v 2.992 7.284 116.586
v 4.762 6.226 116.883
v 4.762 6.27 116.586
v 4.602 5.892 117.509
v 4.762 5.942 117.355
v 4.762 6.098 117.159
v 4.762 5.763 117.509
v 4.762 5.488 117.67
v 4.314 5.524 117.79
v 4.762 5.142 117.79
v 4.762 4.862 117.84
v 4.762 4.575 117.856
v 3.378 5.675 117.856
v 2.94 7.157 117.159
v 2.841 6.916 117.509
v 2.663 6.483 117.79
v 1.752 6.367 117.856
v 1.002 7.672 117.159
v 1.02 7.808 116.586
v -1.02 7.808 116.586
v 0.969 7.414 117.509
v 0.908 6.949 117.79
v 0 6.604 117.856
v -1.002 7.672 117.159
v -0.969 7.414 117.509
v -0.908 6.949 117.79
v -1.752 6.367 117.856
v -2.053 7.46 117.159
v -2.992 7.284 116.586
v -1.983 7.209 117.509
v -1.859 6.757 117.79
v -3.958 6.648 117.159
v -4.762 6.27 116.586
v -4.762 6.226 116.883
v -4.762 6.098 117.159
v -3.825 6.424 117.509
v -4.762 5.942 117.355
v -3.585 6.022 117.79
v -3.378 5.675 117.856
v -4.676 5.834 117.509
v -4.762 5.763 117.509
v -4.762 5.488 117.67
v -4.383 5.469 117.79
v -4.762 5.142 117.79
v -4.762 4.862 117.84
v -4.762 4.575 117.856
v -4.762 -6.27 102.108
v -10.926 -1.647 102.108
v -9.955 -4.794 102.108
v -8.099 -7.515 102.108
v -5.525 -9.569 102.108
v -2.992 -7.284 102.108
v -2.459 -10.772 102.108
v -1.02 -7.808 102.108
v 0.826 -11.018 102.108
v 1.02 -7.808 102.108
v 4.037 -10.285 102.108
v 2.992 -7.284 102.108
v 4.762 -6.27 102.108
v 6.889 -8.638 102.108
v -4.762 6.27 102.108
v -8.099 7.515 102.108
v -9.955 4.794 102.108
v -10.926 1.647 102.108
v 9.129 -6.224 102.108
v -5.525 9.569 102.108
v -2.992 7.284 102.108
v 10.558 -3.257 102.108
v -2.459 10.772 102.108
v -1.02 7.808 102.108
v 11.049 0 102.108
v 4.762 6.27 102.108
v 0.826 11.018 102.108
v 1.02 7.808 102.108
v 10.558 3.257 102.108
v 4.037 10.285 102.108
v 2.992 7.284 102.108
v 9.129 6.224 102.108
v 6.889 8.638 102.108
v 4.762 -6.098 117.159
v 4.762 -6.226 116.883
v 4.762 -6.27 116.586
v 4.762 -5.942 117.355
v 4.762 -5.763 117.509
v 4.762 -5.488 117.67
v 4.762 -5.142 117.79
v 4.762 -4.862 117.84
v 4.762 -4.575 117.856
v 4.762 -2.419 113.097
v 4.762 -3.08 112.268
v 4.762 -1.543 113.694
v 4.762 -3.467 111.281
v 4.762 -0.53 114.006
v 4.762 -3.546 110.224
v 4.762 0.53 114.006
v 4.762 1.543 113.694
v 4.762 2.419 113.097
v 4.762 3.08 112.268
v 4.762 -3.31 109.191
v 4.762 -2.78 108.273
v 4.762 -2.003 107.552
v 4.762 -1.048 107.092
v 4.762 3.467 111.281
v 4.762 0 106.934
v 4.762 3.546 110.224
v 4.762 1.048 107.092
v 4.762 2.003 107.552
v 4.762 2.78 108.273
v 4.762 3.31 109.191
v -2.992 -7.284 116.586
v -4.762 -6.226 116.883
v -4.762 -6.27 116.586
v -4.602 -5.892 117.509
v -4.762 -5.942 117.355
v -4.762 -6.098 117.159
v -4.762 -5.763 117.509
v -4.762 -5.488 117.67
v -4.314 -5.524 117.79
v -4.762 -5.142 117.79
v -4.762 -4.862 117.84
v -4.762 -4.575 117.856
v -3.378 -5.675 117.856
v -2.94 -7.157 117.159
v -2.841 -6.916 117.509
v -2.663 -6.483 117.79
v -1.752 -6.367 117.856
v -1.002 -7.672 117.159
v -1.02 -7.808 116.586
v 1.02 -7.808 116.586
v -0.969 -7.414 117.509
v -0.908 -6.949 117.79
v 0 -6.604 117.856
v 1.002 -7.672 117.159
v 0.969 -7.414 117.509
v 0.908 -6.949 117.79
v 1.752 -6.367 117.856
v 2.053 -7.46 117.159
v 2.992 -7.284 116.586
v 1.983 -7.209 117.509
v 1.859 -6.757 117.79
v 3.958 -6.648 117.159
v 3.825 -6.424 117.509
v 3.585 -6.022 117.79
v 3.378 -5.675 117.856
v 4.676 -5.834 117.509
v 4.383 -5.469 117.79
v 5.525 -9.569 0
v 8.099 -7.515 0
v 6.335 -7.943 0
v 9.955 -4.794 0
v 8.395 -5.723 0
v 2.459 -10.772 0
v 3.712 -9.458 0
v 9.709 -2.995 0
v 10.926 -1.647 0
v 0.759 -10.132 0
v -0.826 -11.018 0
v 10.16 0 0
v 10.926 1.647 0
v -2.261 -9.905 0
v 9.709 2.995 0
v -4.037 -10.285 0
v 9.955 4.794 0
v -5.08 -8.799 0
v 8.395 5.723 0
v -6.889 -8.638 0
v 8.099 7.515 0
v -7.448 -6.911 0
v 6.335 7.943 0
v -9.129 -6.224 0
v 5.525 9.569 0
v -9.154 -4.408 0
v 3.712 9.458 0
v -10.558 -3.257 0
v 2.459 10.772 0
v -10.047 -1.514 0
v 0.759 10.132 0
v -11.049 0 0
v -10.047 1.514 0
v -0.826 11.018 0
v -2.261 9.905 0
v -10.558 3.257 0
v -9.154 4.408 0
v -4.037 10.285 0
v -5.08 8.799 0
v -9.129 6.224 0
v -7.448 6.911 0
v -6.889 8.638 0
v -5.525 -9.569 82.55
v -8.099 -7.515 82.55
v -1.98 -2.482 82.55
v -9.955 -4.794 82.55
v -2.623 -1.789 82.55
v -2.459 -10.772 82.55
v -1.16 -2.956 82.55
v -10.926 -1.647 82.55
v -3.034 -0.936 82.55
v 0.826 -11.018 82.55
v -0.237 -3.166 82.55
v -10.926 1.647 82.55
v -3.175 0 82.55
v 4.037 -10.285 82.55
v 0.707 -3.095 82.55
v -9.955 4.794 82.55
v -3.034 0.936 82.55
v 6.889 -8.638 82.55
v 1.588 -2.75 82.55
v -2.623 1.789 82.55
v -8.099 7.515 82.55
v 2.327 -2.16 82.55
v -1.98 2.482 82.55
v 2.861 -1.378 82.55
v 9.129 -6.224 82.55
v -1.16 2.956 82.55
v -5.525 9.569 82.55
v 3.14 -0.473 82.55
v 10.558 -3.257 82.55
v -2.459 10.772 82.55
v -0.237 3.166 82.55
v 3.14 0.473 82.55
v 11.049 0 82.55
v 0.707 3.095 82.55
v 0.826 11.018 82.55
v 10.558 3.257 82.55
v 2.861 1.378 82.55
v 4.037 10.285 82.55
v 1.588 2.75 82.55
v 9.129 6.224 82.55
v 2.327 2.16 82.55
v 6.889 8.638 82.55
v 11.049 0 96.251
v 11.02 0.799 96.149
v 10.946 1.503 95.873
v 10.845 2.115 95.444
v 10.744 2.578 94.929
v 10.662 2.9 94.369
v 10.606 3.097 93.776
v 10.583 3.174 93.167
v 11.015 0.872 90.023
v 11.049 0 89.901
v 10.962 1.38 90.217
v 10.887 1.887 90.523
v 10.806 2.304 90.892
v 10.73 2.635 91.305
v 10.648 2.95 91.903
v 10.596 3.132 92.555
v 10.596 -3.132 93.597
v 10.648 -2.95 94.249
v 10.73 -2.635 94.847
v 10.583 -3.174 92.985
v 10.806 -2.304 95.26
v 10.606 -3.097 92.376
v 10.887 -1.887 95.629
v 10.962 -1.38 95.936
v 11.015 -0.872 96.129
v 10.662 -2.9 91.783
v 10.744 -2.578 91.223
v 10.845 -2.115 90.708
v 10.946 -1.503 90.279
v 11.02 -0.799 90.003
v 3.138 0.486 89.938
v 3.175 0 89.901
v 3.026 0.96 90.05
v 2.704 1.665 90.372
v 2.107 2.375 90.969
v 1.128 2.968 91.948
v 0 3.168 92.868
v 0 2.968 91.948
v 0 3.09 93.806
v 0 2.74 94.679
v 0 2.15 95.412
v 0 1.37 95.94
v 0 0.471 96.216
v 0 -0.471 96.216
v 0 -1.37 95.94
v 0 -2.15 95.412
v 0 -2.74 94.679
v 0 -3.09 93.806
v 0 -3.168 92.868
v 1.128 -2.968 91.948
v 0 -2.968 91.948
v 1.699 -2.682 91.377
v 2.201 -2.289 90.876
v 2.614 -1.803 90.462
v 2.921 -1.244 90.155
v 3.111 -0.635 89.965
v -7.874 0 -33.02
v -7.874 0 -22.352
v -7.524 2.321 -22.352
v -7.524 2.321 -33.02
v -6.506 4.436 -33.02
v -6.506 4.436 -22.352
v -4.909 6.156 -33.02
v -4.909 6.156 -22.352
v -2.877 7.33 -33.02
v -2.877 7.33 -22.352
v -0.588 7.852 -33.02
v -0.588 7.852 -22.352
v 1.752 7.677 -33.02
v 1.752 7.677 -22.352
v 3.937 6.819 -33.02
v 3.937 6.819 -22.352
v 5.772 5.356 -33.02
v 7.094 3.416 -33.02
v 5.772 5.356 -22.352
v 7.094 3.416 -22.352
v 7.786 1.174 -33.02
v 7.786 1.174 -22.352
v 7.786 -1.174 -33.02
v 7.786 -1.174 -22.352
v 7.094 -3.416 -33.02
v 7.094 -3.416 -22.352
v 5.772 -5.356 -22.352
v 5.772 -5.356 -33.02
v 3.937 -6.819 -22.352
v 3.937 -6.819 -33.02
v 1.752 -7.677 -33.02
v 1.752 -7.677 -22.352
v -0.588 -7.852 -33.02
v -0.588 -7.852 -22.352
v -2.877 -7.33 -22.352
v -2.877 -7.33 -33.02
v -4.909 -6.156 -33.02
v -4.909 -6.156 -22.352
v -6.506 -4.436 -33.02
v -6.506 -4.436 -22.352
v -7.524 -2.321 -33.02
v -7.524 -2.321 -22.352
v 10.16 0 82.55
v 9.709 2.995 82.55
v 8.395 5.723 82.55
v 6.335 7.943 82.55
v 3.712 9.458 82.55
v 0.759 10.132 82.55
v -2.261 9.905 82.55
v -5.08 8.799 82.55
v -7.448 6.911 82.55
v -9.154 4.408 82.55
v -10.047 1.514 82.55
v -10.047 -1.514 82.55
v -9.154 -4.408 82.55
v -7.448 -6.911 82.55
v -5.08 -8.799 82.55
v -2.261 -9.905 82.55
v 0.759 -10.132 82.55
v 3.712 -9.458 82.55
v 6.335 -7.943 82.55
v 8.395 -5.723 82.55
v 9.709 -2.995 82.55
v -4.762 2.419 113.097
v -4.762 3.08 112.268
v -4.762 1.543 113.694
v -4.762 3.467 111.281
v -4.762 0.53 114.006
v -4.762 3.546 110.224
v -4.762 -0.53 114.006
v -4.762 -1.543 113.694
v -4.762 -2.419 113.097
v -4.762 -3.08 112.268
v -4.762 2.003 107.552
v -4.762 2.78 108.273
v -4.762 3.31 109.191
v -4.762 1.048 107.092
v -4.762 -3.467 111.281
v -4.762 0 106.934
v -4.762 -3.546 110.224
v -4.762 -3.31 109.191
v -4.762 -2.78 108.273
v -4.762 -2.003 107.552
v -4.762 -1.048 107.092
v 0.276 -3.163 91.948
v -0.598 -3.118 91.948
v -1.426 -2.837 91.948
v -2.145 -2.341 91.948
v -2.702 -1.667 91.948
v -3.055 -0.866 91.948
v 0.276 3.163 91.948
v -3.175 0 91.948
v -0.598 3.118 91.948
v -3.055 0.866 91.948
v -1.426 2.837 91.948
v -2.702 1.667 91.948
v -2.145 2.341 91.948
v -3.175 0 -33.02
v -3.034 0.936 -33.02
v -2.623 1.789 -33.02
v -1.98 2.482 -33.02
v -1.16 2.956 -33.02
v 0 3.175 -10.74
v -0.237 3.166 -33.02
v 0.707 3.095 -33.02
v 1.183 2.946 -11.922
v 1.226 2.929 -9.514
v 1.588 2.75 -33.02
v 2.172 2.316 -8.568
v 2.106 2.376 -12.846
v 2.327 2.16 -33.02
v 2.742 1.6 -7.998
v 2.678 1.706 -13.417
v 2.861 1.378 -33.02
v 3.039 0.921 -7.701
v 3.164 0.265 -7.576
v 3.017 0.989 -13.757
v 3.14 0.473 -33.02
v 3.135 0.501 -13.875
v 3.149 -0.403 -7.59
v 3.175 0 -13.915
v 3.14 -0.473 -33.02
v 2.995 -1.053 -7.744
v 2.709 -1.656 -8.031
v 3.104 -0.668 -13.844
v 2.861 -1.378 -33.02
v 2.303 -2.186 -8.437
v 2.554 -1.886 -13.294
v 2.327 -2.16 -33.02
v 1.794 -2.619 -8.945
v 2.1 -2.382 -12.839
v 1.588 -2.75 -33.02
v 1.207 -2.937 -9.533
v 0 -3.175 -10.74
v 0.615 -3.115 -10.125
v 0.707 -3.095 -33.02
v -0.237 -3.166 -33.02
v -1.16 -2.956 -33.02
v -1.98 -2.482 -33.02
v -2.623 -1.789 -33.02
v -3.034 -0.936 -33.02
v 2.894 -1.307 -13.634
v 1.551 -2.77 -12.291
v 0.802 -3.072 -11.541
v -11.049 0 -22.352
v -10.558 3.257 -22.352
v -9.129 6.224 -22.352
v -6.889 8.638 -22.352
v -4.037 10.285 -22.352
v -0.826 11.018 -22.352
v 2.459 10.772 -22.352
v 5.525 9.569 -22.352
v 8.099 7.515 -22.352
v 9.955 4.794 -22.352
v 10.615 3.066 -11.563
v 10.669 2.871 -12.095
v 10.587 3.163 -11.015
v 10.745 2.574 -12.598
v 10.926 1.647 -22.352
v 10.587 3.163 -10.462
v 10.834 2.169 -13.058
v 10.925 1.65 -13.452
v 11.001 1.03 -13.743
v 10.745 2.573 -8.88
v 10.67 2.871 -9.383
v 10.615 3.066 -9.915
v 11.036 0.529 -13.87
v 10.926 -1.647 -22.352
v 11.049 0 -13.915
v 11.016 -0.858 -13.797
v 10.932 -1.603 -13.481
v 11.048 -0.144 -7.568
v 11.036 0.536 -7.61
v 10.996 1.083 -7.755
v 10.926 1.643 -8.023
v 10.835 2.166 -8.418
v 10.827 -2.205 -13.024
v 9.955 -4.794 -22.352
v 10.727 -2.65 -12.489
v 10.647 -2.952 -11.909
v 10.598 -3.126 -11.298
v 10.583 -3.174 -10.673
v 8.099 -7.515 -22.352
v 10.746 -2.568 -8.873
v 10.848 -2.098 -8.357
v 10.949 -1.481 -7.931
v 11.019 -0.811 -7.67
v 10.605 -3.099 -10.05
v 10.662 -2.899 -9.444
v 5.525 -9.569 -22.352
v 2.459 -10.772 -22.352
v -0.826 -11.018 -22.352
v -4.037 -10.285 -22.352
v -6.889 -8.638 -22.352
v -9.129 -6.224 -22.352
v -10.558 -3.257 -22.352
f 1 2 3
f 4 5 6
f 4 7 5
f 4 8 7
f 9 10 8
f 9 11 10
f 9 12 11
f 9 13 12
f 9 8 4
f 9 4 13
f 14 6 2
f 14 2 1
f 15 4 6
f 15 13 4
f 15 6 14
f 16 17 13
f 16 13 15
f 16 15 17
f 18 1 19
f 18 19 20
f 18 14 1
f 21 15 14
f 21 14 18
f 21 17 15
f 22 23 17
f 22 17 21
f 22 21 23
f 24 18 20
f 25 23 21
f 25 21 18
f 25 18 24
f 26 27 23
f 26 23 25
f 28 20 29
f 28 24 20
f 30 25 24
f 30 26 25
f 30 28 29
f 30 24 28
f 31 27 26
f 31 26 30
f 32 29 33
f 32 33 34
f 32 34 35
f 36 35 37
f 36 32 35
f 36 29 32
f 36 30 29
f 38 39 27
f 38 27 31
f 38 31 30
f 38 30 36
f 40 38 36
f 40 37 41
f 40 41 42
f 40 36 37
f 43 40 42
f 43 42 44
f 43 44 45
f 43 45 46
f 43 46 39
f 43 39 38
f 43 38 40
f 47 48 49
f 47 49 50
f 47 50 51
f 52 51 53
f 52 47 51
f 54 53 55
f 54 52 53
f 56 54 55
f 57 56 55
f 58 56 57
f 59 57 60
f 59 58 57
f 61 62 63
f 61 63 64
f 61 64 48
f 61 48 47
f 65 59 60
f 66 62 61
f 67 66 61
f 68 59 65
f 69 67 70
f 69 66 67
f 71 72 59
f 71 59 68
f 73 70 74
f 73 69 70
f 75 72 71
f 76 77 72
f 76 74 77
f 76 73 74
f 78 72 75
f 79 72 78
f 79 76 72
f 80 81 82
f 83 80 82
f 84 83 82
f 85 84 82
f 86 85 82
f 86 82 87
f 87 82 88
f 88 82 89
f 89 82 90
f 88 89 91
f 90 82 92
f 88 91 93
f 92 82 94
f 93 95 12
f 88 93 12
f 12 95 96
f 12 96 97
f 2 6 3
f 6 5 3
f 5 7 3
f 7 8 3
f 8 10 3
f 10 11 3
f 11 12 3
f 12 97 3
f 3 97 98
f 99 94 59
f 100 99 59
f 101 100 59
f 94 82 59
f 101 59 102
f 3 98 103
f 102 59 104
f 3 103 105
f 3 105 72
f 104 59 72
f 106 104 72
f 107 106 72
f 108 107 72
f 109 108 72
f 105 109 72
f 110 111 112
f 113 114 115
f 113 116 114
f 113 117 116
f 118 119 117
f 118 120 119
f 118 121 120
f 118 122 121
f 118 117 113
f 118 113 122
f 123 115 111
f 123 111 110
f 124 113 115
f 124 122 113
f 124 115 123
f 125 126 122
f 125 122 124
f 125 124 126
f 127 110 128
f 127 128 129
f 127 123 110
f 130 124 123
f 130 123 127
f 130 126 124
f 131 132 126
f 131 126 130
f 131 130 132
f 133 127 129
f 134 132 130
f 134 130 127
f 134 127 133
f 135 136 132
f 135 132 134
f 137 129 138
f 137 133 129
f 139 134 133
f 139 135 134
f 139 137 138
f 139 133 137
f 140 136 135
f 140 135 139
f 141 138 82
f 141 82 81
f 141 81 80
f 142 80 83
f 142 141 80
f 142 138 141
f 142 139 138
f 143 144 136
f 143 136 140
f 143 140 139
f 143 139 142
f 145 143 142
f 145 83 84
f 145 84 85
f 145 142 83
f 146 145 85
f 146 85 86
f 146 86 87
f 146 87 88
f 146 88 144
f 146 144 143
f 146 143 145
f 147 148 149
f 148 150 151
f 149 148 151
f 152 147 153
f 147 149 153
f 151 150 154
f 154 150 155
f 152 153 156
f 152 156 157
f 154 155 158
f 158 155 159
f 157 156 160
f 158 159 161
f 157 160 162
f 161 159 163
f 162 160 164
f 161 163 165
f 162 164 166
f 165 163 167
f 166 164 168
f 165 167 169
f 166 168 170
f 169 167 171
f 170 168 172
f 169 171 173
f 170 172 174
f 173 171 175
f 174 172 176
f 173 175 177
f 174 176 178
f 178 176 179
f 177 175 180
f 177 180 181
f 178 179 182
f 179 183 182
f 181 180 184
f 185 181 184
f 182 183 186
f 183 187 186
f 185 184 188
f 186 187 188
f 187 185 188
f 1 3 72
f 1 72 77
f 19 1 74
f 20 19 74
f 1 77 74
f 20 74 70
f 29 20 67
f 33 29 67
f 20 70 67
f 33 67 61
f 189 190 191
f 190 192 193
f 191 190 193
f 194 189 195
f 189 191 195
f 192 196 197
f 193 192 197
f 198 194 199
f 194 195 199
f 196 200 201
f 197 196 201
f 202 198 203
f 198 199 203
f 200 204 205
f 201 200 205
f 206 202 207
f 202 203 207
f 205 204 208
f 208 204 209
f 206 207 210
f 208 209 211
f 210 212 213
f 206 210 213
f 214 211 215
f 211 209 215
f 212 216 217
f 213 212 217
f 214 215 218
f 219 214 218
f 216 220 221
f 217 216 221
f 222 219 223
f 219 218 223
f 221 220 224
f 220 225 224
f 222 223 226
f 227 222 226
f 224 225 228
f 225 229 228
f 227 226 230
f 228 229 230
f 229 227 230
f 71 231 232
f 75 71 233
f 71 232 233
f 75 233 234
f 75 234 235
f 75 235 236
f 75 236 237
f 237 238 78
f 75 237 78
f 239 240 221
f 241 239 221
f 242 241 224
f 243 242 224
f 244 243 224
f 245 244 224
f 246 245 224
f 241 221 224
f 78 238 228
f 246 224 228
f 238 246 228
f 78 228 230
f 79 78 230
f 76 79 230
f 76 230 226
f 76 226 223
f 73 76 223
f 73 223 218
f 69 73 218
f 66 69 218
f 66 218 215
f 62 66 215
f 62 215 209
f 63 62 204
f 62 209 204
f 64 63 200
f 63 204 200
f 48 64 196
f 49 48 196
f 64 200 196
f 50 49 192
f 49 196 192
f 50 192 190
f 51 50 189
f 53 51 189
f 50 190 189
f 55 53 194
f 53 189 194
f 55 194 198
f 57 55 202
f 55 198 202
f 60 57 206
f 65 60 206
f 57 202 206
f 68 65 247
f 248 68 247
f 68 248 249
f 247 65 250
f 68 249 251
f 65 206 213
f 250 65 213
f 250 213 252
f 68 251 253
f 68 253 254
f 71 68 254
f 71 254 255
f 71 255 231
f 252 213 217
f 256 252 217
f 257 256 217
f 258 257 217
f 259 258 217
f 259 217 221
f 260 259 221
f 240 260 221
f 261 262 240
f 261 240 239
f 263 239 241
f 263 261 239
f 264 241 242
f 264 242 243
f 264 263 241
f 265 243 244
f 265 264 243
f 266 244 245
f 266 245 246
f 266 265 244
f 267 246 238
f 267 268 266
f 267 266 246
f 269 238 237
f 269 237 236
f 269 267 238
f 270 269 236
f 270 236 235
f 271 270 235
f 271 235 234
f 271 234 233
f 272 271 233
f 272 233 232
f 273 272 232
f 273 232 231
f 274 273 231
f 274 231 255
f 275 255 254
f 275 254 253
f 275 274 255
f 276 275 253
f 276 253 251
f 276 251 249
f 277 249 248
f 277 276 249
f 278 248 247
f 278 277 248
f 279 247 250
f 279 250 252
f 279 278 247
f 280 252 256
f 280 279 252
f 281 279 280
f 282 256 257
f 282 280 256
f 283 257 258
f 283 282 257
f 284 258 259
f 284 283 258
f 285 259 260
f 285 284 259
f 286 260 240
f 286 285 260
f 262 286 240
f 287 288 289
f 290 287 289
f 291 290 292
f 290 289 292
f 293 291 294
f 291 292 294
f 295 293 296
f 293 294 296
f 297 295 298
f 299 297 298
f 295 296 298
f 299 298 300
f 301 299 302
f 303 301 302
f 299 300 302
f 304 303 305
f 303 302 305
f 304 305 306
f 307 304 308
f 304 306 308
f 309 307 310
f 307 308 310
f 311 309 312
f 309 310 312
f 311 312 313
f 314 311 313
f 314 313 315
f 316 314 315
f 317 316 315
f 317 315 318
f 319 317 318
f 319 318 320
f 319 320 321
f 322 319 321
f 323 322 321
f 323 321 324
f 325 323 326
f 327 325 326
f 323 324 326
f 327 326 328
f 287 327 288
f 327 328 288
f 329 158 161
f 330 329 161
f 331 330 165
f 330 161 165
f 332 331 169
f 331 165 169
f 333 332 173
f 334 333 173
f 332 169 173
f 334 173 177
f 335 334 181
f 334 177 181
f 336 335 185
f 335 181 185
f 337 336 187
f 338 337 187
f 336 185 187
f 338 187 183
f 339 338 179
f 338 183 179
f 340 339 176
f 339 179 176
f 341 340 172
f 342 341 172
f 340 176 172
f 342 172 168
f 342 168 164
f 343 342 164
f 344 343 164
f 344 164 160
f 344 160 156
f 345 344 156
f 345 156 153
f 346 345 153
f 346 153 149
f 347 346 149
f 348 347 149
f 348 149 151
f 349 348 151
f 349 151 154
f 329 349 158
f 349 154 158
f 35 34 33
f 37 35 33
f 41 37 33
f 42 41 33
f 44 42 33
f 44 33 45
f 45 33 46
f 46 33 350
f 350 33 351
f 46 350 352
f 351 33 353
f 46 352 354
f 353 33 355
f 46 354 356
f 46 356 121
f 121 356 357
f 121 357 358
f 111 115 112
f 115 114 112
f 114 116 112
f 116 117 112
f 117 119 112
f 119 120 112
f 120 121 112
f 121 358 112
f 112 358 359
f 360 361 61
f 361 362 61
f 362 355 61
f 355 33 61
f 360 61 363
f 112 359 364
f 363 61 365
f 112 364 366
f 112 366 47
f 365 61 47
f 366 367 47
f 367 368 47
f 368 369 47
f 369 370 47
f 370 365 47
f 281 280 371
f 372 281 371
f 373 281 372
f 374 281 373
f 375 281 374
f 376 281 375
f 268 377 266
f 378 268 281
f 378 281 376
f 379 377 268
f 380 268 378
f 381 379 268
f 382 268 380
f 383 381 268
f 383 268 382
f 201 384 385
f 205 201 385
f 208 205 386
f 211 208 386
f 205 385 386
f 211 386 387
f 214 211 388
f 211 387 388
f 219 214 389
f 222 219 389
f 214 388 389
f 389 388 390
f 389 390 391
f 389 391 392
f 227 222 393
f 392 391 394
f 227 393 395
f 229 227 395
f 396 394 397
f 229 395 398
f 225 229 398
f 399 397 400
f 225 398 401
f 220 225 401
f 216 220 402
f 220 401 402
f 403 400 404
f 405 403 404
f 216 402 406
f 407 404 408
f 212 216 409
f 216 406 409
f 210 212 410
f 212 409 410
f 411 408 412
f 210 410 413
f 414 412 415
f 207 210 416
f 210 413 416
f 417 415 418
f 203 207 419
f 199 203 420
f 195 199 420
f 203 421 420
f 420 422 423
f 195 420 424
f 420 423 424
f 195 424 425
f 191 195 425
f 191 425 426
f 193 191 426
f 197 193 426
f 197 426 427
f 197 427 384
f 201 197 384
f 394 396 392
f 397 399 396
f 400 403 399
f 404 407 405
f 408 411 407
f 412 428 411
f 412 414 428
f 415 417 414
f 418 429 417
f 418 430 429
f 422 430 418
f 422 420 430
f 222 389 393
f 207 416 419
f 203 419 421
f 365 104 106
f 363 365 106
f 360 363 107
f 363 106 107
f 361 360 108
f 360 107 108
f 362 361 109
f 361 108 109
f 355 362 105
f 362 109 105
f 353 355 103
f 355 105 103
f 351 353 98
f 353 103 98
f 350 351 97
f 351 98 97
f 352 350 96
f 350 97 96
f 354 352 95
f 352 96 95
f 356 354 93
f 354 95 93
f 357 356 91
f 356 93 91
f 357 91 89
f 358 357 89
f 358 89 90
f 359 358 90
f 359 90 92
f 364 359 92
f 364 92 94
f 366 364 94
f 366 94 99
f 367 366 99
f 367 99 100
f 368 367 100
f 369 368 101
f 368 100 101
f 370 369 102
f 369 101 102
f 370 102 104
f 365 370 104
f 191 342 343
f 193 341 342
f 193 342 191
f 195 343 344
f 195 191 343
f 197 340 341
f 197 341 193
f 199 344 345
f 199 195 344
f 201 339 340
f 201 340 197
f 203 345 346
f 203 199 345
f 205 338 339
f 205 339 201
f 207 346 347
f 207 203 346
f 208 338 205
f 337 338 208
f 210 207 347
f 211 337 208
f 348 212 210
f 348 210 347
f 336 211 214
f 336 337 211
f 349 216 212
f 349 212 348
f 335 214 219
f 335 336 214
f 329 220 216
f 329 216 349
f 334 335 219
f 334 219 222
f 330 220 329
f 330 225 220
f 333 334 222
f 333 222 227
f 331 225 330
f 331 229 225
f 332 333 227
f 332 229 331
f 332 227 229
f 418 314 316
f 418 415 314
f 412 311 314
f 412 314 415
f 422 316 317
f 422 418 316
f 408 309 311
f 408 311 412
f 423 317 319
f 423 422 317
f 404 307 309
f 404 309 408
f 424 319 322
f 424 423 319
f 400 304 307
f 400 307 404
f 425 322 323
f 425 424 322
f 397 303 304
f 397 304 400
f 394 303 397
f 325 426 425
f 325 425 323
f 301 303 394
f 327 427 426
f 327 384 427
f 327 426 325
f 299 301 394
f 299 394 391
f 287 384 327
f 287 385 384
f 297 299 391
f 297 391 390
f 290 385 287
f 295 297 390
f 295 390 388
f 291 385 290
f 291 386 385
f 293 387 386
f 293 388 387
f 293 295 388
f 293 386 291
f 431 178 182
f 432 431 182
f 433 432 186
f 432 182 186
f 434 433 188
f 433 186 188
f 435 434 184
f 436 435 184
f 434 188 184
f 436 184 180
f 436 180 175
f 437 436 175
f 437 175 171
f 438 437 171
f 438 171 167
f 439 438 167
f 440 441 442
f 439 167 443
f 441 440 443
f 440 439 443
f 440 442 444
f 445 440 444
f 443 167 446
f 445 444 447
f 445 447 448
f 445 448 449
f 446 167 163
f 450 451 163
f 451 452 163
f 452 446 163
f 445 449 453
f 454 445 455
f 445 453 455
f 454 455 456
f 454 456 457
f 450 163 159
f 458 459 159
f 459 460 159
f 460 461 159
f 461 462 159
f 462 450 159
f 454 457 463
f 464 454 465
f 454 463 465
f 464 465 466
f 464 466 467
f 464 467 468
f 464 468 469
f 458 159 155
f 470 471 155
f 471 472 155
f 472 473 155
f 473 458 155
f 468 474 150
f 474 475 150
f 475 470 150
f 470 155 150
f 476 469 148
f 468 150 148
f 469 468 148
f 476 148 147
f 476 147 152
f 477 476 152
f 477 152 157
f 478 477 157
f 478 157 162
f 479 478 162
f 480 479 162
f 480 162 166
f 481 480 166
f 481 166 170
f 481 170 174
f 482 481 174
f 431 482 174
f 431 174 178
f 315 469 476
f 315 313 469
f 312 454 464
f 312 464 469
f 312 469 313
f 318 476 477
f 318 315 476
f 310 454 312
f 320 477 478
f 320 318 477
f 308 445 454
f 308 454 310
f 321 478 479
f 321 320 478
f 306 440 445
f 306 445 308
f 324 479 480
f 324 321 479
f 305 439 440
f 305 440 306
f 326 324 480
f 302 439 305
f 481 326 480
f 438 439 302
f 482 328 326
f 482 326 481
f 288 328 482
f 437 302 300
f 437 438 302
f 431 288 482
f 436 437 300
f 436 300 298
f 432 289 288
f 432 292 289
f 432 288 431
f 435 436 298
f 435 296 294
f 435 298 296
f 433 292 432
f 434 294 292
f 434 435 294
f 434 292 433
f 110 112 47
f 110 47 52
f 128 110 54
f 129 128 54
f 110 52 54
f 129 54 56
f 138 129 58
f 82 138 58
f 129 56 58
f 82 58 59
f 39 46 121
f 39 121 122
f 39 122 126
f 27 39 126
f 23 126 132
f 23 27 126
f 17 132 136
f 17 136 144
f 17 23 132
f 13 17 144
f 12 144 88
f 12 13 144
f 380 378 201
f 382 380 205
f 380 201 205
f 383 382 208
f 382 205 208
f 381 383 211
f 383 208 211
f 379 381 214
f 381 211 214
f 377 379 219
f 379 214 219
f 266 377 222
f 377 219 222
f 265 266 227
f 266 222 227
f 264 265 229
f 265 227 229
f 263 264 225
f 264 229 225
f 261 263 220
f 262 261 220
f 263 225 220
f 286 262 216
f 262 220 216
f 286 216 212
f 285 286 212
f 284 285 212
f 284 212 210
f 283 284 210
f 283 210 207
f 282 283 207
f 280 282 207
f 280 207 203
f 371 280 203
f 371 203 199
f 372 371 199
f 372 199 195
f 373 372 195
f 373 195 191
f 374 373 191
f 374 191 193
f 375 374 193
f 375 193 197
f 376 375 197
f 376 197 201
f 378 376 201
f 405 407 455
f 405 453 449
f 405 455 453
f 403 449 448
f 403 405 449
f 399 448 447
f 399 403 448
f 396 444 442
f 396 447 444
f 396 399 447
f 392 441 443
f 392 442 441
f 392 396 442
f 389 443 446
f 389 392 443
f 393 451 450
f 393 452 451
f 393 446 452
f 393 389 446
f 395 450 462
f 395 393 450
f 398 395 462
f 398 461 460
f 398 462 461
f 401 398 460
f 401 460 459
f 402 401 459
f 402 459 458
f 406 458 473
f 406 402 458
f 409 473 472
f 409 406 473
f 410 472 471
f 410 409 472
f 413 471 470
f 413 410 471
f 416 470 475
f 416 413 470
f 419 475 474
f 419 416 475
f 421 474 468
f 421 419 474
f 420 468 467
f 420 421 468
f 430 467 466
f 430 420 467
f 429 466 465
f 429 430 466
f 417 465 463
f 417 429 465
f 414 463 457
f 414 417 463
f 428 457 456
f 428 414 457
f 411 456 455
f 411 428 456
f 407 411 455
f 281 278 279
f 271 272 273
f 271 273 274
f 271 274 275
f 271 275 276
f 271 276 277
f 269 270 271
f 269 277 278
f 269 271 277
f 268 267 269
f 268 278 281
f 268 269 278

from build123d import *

# Parameters (mm, degrees)
SKETCH1_R           = 10.16
BOSS_EXTRUDE1_DEPTH = 82.55
SKETCH2_R           = 11.049
BOSS_EXTRUDE2_DEPTH = 19.558
BOSS_EXTRUDE3_DEPTH = 15.748
SKETCH4_R           = 3.556
CUT_EXTRUDE1_DEPTH  = 9.525
FILLET1_R           = 1.27
SKETCH5_R           = 11.049
BOSS_EXTRUDE4_DEPTH = 22.352
SKETCH6_R           = 7.874
BOSS_EXTRUDE5_DEPTH = 10.668
SKETCH7_R           = 3.175
CUT_EXTRUDE2_DEPTH  = 124.968
SKETCH8_R           = 3.175
CUT_EXTRUDE3_DEPTH  = 11.049


with BuildPart() as part:
    # Sketch1 → Boss-Extrude1 (new body)
    with BuildSketch(Plane.XY):
        Circle(SKETCH1_R)
    extrude(amount=BOSS_EXTRUDE1_DEPTH)

    # Sketch5 → Boss-Extrude4 (add)
    with BuildSketch(Plane(origin=(0, 0, 0), x_dir=(-1, 0, 0), z_dir=(0, 0, -1))):
        Circle(SKETCH5_R)
    extrude(amount=BOSS_EXTRUDE4_DEPTH)

    # Sketch6 → Boss-Extrude5 (add)
    with BuildSketch(Plane(origin=(0, 0, -22.352), x_dir=(-1, 0, 0), z_dir=(0, 0, -1))):
        Circle(SKETCH6_R)
    extrude(amount=BOSS_EXTRUDE5_DEPTH)


with BuildPart() as body_2:
    # Sketch2 → Boss-Extrude2 (new body)
    with BuildSketch(Plane.XY.offset(82.55)):
        Circle(SKETCH2_R)
    extrude(amount=BOSS_EXTRUDE2_DEPTH)

    # Sketch3 → Boss-Extrude3 (add)
    with BuildSketch(Plane.XY.offset(102.108)):
        with BuildLine():
            Line((4.7625, -6.270444143), (4.7625, 6.270444143))
            ThreePointArc((4.7625, 6.270444143), (0, 7.874), (-4.7625, 6.270444143))
            Line((-4.7625, 6.270444143), (-4.7625, -6.270444143))
            ThreePointArc((-4.7625, -6.270444143), (0, -7.874), (4.7625, -6.270444143))
        make_face()
    extrude(amount=BOSS_EXTRUDE3_DEPTH)

    # Sketch4 → Cut-Extrude1 (cut)
    with BuildSketch(Plane(origin=(4.7625, 0, 0), x_dir=(0, 0, -1), z_dir=(1, 0, 0))):
        with Locations((-110.49, 0)):
            Circle(SKETCH4_R)
    extrude(amount=-CUT_EXTRUDE1_DEPTH, mode=Mode.SUBTRACT)

    # Fillet1
    fillet1_edges = [body_2.edges().sort_by_distance(p)[0] for p in [
        (0, 7.874, 117.856),
        (0, -7.874, 117.856),
    ]]
    fillet(fillet1_edges, radius=FILLET1_R)


with BuildPart() as cut_extrude2_tool:
    # Sketch7 → Cut-Extrude2 (new body)
    with BuildSketch(Plane(origin=(0, 0, -33.02), x_dir=(-1, 0, 0), z_dir=(0, 0, -1))):
        Circle(SKETCH7_R)
    extrude(amount=-CUT_EXTRUDE2_DEPTH)


with BuildPart() as part_1:
    add(part.part)

    # Cut-Extrude2: cut by cut_extrude2_tool
    add(cut_extrude2_tool.part, mode=Mode.SUBTRACT)


with BuildPart() as body_2_1:
    add(body_2.part)

    # Cut-Extrude2: cut by cut_extrude2_tool
    add(cut_extrude2_tool.part, mode=Mode.SUBTRACT)


with BuildPart() as cut_extrude3_tool:
    # Sketch8 → Cut-Extrude3 (new body)
    with BuildSketch(Plane(origin=(0, 0, 0), x_dir=(0, 0, -1), z_dir=(1, 0, 0))):
        with Locations((-93.076077846, 0)):
            Circle(SKETCH8_R)
        with Locations((10.739797543, 0)):
            Circle(SKETCH8_R)
    extrude(amount=CUT_EXTRUDE3_DEPTH)


with BuildPart() as part_2:
    add(part_1.part)

    # Cut-Extrude3: cut by cut_extrude3_tool
    add(cut_extrude3_tool.part, mode=Mode.SUBTRACT)


with BuildPart() as body_2_2:
    add(body_2_1.part)

    # Cut-Extrude3: cut by cut_extrude3_tool
    add(cut_extrude3_tool.part, mode=Mode.SUBTRACT)


solid = Compound([part_2.part, body_2_2.part])
